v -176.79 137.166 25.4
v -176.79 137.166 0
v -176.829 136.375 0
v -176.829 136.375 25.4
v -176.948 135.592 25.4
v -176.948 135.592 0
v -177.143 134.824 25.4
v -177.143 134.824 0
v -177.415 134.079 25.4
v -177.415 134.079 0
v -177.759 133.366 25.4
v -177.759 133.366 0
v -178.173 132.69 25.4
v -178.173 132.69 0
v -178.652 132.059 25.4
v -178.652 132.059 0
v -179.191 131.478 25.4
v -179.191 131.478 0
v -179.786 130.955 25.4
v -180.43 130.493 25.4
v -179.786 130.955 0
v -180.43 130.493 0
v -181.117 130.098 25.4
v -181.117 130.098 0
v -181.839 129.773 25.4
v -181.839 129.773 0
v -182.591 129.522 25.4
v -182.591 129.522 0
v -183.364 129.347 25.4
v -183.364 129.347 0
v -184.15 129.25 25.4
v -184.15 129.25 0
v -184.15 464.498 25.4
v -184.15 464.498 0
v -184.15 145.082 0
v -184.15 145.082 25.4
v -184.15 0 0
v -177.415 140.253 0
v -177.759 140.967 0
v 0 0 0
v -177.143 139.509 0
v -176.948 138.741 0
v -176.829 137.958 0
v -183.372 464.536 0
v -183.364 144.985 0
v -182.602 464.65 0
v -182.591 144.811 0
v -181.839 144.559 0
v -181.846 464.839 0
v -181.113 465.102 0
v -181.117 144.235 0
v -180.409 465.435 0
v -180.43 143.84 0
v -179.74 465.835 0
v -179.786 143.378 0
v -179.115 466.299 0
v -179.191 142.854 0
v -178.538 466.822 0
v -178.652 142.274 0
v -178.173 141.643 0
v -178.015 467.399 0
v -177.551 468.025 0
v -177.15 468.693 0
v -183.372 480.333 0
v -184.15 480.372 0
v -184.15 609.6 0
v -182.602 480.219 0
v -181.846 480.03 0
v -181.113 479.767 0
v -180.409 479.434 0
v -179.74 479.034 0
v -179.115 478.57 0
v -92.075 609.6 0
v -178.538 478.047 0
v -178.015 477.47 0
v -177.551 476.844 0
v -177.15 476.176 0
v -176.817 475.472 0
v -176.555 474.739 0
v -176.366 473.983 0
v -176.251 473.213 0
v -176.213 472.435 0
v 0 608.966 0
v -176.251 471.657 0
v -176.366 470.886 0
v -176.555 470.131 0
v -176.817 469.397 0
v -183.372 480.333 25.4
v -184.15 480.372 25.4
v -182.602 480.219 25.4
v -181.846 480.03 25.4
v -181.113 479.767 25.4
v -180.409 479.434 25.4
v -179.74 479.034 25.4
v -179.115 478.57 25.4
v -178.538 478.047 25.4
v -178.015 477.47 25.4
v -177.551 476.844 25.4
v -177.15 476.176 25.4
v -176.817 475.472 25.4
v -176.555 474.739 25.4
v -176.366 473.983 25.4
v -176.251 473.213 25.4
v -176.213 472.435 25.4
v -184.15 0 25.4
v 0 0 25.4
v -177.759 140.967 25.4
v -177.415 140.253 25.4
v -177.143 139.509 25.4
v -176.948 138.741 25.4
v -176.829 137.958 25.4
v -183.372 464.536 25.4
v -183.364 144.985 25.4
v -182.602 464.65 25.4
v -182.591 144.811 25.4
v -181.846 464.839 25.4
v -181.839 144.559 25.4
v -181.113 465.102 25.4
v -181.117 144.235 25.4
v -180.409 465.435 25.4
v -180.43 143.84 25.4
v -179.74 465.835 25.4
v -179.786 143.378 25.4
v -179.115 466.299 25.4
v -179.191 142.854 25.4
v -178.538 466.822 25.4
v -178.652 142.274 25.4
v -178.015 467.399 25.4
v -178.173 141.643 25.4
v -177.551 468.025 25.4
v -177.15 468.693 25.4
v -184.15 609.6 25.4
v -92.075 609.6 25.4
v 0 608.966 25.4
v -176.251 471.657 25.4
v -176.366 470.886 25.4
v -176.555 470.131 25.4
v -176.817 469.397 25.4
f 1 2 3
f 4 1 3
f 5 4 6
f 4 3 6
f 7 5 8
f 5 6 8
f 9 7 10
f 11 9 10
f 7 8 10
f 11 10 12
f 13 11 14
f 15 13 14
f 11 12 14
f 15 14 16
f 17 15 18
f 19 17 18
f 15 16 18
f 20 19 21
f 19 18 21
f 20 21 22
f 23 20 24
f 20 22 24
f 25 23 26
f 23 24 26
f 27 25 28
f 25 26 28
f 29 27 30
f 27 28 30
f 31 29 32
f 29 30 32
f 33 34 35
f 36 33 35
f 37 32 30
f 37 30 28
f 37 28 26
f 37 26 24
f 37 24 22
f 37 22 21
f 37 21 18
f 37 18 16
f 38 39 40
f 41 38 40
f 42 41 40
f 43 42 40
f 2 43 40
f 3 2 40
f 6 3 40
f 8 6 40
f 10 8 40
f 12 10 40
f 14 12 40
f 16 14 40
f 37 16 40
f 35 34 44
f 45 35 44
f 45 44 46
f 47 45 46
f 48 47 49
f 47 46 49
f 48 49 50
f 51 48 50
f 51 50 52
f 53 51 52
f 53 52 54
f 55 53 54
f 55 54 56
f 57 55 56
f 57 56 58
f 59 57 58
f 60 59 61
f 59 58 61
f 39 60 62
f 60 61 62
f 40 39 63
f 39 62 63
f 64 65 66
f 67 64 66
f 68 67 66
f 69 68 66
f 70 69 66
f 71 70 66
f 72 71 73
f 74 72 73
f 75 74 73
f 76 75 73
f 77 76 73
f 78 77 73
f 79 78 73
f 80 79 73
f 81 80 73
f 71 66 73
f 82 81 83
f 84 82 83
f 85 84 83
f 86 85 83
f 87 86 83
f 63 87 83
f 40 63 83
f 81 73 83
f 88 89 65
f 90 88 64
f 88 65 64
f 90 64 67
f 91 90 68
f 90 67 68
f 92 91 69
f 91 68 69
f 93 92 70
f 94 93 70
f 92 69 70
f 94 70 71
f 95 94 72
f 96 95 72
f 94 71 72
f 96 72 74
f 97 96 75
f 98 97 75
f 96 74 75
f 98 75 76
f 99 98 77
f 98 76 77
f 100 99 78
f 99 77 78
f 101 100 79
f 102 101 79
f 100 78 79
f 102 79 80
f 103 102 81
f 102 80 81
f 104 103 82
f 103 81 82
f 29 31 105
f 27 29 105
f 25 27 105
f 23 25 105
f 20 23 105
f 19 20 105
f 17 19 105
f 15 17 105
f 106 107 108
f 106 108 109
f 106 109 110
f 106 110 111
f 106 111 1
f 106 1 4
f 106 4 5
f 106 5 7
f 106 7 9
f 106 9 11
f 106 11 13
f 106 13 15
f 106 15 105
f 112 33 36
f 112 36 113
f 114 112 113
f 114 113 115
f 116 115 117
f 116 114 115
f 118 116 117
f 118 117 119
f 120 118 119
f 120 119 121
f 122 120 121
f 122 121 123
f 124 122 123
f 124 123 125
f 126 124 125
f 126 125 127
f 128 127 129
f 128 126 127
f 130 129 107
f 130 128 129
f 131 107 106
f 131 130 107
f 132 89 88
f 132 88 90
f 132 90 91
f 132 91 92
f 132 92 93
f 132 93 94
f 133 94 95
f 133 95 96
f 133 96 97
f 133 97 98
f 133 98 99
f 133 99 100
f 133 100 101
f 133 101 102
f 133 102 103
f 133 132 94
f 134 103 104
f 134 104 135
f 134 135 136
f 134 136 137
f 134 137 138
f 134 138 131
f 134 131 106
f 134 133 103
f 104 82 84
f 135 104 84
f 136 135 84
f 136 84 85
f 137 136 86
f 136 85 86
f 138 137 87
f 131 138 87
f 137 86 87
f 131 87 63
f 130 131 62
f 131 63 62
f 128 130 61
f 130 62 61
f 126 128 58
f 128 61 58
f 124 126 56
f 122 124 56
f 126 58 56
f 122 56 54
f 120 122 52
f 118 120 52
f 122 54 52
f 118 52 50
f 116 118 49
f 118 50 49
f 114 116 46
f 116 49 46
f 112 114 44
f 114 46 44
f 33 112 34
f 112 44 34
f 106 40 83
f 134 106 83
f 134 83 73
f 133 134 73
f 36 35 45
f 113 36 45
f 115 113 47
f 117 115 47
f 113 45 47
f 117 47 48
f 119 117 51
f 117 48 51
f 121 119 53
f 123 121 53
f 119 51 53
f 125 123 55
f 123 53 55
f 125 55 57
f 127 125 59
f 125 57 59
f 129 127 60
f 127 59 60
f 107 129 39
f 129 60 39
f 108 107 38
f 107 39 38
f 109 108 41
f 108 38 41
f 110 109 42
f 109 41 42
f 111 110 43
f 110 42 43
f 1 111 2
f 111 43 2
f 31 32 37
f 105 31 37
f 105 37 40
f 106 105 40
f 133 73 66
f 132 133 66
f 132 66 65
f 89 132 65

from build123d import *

# Parameters (mm, degrees)
F1_DEPTH = 25.4


with BuildPart() as f1:
    # F0 (on Top) → F1 (new body)
    with BuildSketch(Plane.XY):
        with BuildLine():
            Line((-184.15, 0), (-92.075, 0))
            Line((-92.075, 0), (-92.075, 609.6))
            Line((-92.075, 609.6), (-184.15, 609.6))
            Line((-184.15, 609.6), (-184.15, 563.878215))
            Line((-184.15, 563.878215), (-184.15, 518.156431))
            Line((-184.15, 518.156431), (-184.15, 480.371638))
            ThreePointArc((-184.15, 480.371638), (-178.537699, 478.046947), (-176.213008, 472.434646))
            ThreePointArc((-176.213008, 472.434646), (-178.537699, 466.822345), (-184.15, 464.497654))
            Line((-184.15, 464.497654), (-184.15, 457.2))
            Line((-184.15, 457.2), (-184.15, 304.8))
            Line((-184.15, 304.8), (-184.15, 152.4))
            Line((-184.15, 152.4), (-184.15, 145.082353))
            ThreePointArc((-184.15, 145.082353), (-178.914135, 142.570877), (-176.789792, 137.166346))
            ThreePointArc((-176.789792, 137.166346), (-178.914135, 131.761815), (-184.15, 129.25034))
            Line((-184.15, 129.25034), (-184.15, 0))
        make_face()
        Polygon((-92.075, 0), (0, 0), (0, 152.241597), (0, 304.483195), (0, 456.724792), (0, 518.156431), (0, 608.966389), (-92.075, 609.6), align=None)
    extrude(amount=F1_DEPTH)


solid = f1.part
